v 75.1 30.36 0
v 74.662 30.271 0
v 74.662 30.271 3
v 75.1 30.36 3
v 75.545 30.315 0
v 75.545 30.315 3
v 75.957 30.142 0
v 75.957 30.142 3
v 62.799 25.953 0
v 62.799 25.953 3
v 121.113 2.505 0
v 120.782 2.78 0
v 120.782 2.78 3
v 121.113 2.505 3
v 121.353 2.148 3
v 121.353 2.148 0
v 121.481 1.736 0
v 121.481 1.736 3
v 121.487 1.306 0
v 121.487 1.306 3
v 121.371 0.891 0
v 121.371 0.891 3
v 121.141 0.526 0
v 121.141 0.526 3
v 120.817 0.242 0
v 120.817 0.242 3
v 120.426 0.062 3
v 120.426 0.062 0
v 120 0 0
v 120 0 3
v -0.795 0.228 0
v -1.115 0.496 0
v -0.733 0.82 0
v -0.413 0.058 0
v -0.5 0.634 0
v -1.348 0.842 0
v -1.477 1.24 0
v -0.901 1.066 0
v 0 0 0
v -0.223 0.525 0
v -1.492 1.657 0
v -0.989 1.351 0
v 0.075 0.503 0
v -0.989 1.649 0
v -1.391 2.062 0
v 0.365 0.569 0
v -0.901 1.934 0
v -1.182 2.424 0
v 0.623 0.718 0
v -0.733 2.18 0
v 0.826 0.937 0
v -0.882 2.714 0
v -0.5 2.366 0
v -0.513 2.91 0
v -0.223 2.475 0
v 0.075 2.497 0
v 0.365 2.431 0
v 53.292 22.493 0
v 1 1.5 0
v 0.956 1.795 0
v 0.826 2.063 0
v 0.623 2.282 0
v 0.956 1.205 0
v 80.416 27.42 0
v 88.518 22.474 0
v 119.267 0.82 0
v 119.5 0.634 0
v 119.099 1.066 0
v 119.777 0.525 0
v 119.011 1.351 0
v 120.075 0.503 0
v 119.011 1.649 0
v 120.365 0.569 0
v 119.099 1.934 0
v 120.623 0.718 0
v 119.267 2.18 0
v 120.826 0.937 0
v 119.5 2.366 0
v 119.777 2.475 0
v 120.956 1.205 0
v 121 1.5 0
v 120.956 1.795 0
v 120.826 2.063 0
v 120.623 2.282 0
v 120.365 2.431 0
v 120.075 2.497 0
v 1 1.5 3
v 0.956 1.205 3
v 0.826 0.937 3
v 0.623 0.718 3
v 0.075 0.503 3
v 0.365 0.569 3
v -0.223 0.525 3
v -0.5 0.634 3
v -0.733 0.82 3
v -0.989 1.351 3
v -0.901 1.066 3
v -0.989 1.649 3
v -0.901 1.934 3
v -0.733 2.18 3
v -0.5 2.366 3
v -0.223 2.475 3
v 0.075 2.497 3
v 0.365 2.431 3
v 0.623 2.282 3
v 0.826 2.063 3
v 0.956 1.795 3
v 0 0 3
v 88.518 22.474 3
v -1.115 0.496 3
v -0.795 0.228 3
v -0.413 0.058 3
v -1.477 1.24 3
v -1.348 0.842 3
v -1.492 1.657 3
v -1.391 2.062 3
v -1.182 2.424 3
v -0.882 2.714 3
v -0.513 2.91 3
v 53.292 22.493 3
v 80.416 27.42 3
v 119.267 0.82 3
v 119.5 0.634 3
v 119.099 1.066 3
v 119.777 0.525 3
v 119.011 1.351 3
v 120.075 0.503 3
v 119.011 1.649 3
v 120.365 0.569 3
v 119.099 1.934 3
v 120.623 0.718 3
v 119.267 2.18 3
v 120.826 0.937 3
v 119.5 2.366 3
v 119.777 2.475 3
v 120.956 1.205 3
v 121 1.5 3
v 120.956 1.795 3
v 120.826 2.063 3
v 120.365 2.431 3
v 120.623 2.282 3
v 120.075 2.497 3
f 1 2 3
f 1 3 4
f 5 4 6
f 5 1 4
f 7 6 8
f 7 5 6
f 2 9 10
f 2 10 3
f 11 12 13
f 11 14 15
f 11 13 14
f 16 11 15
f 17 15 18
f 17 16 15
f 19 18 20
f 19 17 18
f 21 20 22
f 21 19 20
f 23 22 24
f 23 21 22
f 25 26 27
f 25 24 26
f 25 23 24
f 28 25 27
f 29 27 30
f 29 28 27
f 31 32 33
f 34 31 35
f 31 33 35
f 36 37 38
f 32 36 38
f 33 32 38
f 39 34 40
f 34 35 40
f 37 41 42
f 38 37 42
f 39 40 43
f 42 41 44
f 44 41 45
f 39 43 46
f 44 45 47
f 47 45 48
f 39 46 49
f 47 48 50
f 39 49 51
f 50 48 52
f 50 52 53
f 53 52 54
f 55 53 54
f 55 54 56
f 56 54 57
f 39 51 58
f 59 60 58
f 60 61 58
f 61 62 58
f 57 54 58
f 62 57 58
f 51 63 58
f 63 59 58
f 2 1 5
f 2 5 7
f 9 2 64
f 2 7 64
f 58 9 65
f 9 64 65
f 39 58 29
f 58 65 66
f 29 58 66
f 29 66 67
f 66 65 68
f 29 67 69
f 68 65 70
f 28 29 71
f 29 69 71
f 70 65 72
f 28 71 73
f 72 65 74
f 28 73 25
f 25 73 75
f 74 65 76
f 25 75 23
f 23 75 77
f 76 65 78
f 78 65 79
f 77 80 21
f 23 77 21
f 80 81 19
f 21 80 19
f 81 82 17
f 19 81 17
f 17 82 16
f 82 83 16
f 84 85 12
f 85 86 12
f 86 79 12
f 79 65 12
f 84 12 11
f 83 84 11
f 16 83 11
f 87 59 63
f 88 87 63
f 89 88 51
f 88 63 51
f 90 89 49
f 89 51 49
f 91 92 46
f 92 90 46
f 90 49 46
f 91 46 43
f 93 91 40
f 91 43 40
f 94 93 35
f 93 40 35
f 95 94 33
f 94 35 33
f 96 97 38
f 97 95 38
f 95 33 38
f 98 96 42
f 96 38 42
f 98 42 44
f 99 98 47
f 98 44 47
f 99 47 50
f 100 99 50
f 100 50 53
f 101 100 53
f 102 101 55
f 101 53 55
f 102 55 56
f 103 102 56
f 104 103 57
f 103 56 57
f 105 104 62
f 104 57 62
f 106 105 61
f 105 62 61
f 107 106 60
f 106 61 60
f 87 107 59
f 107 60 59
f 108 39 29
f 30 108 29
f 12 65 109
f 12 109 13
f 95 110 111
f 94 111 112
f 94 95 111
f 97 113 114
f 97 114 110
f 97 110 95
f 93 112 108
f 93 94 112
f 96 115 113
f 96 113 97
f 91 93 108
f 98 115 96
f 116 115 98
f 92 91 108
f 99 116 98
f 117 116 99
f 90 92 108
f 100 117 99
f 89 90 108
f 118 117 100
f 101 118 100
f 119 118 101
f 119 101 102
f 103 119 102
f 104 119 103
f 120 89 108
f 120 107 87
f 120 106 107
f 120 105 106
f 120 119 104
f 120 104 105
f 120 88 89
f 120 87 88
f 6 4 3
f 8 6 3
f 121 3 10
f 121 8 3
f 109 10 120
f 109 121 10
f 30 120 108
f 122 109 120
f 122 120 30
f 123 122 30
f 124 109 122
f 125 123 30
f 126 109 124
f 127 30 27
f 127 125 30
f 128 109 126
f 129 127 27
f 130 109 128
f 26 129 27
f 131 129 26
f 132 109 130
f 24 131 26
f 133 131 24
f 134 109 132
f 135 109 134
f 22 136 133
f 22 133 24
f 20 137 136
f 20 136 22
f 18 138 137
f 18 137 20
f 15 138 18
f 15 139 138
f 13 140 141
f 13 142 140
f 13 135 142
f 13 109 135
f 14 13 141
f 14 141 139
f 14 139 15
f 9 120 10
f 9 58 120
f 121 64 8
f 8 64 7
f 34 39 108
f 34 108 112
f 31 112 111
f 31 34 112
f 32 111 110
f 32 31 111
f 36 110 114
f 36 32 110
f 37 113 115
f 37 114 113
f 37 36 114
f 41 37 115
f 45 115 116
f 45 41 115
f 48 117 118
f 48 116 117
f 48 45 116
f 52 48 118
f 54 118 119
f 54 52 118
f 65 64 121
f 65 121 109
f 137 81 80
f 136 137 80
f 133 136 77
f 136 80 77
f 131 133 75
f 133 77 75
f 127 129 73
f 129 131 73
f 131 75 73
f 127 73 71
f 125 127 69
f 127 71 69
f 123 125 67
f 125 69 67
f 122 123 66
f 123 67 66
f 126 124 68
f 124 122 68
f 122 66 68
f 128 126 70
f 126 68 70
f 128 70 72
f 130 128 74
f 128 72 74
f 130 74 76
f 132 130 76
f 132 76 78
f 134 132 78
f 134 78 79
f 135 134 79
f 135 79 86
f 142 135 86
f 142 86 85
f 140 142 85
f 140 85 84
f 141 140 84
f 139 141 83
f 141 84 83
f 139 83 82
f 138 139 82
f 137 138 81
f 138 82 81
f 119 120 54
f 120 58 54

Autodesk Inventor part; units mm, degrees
ref_plane "YZ Plane" through (0, 0, 0) normal (1, 0, 0) x (0, 1, 0)
ref_plane "XZ Plane" through (0, 0, 0) normal (0, 1, 0) x (-1, 0, 0)
ref_plane "XY Plane" through (0, 0, 0) normal (0, 0, 1) x (1, 0, 0)
sketch "Sketch1" plane through (0, 0, 0) normal (0, 0, 1) x (1, 0, 0)
  line L0 (0, 0) -> (120, 0)
  arc A0 (0, 3) -> (0, 0) centre (0, 1.5) ccw
  arc A1 (120, 0) -> (120, 3) centre (120, 1.5) ccw
  circle A2 centre (0, 1.5) radius 1
  circle A3 centre (120, 1.5) radius 1
  arc A4 (75.9569, 30.1419) -> (74.6624, 30.2712) centre (75.1754, 28.8616) ccw
  line L1 (53.292, 22.493) -> (62.7991, 25.9533)
  line L2 (62.7991, 25.9533) -> (74.6624, 30.2712)
  line L3 (53.292, 22.493) -> (-0.513, 2.9095)
  line L4 (80.4155, 27.4204) -> (88.5179, 22.4745)
  line L5 (80.4155, 27.4204) -> (75.9569, 30.1419)
  line L6 (88.5179, 22.4745) -> (120.7815, 2.7803)
  dimension "d0" = 2
  dimension "d1" = 2
  dimension "d2" = 120
  dimension "d8" = 3
extrude "Extrusion1" add sketch "Sketch1" along normal blind 3
properties part number "L3"
